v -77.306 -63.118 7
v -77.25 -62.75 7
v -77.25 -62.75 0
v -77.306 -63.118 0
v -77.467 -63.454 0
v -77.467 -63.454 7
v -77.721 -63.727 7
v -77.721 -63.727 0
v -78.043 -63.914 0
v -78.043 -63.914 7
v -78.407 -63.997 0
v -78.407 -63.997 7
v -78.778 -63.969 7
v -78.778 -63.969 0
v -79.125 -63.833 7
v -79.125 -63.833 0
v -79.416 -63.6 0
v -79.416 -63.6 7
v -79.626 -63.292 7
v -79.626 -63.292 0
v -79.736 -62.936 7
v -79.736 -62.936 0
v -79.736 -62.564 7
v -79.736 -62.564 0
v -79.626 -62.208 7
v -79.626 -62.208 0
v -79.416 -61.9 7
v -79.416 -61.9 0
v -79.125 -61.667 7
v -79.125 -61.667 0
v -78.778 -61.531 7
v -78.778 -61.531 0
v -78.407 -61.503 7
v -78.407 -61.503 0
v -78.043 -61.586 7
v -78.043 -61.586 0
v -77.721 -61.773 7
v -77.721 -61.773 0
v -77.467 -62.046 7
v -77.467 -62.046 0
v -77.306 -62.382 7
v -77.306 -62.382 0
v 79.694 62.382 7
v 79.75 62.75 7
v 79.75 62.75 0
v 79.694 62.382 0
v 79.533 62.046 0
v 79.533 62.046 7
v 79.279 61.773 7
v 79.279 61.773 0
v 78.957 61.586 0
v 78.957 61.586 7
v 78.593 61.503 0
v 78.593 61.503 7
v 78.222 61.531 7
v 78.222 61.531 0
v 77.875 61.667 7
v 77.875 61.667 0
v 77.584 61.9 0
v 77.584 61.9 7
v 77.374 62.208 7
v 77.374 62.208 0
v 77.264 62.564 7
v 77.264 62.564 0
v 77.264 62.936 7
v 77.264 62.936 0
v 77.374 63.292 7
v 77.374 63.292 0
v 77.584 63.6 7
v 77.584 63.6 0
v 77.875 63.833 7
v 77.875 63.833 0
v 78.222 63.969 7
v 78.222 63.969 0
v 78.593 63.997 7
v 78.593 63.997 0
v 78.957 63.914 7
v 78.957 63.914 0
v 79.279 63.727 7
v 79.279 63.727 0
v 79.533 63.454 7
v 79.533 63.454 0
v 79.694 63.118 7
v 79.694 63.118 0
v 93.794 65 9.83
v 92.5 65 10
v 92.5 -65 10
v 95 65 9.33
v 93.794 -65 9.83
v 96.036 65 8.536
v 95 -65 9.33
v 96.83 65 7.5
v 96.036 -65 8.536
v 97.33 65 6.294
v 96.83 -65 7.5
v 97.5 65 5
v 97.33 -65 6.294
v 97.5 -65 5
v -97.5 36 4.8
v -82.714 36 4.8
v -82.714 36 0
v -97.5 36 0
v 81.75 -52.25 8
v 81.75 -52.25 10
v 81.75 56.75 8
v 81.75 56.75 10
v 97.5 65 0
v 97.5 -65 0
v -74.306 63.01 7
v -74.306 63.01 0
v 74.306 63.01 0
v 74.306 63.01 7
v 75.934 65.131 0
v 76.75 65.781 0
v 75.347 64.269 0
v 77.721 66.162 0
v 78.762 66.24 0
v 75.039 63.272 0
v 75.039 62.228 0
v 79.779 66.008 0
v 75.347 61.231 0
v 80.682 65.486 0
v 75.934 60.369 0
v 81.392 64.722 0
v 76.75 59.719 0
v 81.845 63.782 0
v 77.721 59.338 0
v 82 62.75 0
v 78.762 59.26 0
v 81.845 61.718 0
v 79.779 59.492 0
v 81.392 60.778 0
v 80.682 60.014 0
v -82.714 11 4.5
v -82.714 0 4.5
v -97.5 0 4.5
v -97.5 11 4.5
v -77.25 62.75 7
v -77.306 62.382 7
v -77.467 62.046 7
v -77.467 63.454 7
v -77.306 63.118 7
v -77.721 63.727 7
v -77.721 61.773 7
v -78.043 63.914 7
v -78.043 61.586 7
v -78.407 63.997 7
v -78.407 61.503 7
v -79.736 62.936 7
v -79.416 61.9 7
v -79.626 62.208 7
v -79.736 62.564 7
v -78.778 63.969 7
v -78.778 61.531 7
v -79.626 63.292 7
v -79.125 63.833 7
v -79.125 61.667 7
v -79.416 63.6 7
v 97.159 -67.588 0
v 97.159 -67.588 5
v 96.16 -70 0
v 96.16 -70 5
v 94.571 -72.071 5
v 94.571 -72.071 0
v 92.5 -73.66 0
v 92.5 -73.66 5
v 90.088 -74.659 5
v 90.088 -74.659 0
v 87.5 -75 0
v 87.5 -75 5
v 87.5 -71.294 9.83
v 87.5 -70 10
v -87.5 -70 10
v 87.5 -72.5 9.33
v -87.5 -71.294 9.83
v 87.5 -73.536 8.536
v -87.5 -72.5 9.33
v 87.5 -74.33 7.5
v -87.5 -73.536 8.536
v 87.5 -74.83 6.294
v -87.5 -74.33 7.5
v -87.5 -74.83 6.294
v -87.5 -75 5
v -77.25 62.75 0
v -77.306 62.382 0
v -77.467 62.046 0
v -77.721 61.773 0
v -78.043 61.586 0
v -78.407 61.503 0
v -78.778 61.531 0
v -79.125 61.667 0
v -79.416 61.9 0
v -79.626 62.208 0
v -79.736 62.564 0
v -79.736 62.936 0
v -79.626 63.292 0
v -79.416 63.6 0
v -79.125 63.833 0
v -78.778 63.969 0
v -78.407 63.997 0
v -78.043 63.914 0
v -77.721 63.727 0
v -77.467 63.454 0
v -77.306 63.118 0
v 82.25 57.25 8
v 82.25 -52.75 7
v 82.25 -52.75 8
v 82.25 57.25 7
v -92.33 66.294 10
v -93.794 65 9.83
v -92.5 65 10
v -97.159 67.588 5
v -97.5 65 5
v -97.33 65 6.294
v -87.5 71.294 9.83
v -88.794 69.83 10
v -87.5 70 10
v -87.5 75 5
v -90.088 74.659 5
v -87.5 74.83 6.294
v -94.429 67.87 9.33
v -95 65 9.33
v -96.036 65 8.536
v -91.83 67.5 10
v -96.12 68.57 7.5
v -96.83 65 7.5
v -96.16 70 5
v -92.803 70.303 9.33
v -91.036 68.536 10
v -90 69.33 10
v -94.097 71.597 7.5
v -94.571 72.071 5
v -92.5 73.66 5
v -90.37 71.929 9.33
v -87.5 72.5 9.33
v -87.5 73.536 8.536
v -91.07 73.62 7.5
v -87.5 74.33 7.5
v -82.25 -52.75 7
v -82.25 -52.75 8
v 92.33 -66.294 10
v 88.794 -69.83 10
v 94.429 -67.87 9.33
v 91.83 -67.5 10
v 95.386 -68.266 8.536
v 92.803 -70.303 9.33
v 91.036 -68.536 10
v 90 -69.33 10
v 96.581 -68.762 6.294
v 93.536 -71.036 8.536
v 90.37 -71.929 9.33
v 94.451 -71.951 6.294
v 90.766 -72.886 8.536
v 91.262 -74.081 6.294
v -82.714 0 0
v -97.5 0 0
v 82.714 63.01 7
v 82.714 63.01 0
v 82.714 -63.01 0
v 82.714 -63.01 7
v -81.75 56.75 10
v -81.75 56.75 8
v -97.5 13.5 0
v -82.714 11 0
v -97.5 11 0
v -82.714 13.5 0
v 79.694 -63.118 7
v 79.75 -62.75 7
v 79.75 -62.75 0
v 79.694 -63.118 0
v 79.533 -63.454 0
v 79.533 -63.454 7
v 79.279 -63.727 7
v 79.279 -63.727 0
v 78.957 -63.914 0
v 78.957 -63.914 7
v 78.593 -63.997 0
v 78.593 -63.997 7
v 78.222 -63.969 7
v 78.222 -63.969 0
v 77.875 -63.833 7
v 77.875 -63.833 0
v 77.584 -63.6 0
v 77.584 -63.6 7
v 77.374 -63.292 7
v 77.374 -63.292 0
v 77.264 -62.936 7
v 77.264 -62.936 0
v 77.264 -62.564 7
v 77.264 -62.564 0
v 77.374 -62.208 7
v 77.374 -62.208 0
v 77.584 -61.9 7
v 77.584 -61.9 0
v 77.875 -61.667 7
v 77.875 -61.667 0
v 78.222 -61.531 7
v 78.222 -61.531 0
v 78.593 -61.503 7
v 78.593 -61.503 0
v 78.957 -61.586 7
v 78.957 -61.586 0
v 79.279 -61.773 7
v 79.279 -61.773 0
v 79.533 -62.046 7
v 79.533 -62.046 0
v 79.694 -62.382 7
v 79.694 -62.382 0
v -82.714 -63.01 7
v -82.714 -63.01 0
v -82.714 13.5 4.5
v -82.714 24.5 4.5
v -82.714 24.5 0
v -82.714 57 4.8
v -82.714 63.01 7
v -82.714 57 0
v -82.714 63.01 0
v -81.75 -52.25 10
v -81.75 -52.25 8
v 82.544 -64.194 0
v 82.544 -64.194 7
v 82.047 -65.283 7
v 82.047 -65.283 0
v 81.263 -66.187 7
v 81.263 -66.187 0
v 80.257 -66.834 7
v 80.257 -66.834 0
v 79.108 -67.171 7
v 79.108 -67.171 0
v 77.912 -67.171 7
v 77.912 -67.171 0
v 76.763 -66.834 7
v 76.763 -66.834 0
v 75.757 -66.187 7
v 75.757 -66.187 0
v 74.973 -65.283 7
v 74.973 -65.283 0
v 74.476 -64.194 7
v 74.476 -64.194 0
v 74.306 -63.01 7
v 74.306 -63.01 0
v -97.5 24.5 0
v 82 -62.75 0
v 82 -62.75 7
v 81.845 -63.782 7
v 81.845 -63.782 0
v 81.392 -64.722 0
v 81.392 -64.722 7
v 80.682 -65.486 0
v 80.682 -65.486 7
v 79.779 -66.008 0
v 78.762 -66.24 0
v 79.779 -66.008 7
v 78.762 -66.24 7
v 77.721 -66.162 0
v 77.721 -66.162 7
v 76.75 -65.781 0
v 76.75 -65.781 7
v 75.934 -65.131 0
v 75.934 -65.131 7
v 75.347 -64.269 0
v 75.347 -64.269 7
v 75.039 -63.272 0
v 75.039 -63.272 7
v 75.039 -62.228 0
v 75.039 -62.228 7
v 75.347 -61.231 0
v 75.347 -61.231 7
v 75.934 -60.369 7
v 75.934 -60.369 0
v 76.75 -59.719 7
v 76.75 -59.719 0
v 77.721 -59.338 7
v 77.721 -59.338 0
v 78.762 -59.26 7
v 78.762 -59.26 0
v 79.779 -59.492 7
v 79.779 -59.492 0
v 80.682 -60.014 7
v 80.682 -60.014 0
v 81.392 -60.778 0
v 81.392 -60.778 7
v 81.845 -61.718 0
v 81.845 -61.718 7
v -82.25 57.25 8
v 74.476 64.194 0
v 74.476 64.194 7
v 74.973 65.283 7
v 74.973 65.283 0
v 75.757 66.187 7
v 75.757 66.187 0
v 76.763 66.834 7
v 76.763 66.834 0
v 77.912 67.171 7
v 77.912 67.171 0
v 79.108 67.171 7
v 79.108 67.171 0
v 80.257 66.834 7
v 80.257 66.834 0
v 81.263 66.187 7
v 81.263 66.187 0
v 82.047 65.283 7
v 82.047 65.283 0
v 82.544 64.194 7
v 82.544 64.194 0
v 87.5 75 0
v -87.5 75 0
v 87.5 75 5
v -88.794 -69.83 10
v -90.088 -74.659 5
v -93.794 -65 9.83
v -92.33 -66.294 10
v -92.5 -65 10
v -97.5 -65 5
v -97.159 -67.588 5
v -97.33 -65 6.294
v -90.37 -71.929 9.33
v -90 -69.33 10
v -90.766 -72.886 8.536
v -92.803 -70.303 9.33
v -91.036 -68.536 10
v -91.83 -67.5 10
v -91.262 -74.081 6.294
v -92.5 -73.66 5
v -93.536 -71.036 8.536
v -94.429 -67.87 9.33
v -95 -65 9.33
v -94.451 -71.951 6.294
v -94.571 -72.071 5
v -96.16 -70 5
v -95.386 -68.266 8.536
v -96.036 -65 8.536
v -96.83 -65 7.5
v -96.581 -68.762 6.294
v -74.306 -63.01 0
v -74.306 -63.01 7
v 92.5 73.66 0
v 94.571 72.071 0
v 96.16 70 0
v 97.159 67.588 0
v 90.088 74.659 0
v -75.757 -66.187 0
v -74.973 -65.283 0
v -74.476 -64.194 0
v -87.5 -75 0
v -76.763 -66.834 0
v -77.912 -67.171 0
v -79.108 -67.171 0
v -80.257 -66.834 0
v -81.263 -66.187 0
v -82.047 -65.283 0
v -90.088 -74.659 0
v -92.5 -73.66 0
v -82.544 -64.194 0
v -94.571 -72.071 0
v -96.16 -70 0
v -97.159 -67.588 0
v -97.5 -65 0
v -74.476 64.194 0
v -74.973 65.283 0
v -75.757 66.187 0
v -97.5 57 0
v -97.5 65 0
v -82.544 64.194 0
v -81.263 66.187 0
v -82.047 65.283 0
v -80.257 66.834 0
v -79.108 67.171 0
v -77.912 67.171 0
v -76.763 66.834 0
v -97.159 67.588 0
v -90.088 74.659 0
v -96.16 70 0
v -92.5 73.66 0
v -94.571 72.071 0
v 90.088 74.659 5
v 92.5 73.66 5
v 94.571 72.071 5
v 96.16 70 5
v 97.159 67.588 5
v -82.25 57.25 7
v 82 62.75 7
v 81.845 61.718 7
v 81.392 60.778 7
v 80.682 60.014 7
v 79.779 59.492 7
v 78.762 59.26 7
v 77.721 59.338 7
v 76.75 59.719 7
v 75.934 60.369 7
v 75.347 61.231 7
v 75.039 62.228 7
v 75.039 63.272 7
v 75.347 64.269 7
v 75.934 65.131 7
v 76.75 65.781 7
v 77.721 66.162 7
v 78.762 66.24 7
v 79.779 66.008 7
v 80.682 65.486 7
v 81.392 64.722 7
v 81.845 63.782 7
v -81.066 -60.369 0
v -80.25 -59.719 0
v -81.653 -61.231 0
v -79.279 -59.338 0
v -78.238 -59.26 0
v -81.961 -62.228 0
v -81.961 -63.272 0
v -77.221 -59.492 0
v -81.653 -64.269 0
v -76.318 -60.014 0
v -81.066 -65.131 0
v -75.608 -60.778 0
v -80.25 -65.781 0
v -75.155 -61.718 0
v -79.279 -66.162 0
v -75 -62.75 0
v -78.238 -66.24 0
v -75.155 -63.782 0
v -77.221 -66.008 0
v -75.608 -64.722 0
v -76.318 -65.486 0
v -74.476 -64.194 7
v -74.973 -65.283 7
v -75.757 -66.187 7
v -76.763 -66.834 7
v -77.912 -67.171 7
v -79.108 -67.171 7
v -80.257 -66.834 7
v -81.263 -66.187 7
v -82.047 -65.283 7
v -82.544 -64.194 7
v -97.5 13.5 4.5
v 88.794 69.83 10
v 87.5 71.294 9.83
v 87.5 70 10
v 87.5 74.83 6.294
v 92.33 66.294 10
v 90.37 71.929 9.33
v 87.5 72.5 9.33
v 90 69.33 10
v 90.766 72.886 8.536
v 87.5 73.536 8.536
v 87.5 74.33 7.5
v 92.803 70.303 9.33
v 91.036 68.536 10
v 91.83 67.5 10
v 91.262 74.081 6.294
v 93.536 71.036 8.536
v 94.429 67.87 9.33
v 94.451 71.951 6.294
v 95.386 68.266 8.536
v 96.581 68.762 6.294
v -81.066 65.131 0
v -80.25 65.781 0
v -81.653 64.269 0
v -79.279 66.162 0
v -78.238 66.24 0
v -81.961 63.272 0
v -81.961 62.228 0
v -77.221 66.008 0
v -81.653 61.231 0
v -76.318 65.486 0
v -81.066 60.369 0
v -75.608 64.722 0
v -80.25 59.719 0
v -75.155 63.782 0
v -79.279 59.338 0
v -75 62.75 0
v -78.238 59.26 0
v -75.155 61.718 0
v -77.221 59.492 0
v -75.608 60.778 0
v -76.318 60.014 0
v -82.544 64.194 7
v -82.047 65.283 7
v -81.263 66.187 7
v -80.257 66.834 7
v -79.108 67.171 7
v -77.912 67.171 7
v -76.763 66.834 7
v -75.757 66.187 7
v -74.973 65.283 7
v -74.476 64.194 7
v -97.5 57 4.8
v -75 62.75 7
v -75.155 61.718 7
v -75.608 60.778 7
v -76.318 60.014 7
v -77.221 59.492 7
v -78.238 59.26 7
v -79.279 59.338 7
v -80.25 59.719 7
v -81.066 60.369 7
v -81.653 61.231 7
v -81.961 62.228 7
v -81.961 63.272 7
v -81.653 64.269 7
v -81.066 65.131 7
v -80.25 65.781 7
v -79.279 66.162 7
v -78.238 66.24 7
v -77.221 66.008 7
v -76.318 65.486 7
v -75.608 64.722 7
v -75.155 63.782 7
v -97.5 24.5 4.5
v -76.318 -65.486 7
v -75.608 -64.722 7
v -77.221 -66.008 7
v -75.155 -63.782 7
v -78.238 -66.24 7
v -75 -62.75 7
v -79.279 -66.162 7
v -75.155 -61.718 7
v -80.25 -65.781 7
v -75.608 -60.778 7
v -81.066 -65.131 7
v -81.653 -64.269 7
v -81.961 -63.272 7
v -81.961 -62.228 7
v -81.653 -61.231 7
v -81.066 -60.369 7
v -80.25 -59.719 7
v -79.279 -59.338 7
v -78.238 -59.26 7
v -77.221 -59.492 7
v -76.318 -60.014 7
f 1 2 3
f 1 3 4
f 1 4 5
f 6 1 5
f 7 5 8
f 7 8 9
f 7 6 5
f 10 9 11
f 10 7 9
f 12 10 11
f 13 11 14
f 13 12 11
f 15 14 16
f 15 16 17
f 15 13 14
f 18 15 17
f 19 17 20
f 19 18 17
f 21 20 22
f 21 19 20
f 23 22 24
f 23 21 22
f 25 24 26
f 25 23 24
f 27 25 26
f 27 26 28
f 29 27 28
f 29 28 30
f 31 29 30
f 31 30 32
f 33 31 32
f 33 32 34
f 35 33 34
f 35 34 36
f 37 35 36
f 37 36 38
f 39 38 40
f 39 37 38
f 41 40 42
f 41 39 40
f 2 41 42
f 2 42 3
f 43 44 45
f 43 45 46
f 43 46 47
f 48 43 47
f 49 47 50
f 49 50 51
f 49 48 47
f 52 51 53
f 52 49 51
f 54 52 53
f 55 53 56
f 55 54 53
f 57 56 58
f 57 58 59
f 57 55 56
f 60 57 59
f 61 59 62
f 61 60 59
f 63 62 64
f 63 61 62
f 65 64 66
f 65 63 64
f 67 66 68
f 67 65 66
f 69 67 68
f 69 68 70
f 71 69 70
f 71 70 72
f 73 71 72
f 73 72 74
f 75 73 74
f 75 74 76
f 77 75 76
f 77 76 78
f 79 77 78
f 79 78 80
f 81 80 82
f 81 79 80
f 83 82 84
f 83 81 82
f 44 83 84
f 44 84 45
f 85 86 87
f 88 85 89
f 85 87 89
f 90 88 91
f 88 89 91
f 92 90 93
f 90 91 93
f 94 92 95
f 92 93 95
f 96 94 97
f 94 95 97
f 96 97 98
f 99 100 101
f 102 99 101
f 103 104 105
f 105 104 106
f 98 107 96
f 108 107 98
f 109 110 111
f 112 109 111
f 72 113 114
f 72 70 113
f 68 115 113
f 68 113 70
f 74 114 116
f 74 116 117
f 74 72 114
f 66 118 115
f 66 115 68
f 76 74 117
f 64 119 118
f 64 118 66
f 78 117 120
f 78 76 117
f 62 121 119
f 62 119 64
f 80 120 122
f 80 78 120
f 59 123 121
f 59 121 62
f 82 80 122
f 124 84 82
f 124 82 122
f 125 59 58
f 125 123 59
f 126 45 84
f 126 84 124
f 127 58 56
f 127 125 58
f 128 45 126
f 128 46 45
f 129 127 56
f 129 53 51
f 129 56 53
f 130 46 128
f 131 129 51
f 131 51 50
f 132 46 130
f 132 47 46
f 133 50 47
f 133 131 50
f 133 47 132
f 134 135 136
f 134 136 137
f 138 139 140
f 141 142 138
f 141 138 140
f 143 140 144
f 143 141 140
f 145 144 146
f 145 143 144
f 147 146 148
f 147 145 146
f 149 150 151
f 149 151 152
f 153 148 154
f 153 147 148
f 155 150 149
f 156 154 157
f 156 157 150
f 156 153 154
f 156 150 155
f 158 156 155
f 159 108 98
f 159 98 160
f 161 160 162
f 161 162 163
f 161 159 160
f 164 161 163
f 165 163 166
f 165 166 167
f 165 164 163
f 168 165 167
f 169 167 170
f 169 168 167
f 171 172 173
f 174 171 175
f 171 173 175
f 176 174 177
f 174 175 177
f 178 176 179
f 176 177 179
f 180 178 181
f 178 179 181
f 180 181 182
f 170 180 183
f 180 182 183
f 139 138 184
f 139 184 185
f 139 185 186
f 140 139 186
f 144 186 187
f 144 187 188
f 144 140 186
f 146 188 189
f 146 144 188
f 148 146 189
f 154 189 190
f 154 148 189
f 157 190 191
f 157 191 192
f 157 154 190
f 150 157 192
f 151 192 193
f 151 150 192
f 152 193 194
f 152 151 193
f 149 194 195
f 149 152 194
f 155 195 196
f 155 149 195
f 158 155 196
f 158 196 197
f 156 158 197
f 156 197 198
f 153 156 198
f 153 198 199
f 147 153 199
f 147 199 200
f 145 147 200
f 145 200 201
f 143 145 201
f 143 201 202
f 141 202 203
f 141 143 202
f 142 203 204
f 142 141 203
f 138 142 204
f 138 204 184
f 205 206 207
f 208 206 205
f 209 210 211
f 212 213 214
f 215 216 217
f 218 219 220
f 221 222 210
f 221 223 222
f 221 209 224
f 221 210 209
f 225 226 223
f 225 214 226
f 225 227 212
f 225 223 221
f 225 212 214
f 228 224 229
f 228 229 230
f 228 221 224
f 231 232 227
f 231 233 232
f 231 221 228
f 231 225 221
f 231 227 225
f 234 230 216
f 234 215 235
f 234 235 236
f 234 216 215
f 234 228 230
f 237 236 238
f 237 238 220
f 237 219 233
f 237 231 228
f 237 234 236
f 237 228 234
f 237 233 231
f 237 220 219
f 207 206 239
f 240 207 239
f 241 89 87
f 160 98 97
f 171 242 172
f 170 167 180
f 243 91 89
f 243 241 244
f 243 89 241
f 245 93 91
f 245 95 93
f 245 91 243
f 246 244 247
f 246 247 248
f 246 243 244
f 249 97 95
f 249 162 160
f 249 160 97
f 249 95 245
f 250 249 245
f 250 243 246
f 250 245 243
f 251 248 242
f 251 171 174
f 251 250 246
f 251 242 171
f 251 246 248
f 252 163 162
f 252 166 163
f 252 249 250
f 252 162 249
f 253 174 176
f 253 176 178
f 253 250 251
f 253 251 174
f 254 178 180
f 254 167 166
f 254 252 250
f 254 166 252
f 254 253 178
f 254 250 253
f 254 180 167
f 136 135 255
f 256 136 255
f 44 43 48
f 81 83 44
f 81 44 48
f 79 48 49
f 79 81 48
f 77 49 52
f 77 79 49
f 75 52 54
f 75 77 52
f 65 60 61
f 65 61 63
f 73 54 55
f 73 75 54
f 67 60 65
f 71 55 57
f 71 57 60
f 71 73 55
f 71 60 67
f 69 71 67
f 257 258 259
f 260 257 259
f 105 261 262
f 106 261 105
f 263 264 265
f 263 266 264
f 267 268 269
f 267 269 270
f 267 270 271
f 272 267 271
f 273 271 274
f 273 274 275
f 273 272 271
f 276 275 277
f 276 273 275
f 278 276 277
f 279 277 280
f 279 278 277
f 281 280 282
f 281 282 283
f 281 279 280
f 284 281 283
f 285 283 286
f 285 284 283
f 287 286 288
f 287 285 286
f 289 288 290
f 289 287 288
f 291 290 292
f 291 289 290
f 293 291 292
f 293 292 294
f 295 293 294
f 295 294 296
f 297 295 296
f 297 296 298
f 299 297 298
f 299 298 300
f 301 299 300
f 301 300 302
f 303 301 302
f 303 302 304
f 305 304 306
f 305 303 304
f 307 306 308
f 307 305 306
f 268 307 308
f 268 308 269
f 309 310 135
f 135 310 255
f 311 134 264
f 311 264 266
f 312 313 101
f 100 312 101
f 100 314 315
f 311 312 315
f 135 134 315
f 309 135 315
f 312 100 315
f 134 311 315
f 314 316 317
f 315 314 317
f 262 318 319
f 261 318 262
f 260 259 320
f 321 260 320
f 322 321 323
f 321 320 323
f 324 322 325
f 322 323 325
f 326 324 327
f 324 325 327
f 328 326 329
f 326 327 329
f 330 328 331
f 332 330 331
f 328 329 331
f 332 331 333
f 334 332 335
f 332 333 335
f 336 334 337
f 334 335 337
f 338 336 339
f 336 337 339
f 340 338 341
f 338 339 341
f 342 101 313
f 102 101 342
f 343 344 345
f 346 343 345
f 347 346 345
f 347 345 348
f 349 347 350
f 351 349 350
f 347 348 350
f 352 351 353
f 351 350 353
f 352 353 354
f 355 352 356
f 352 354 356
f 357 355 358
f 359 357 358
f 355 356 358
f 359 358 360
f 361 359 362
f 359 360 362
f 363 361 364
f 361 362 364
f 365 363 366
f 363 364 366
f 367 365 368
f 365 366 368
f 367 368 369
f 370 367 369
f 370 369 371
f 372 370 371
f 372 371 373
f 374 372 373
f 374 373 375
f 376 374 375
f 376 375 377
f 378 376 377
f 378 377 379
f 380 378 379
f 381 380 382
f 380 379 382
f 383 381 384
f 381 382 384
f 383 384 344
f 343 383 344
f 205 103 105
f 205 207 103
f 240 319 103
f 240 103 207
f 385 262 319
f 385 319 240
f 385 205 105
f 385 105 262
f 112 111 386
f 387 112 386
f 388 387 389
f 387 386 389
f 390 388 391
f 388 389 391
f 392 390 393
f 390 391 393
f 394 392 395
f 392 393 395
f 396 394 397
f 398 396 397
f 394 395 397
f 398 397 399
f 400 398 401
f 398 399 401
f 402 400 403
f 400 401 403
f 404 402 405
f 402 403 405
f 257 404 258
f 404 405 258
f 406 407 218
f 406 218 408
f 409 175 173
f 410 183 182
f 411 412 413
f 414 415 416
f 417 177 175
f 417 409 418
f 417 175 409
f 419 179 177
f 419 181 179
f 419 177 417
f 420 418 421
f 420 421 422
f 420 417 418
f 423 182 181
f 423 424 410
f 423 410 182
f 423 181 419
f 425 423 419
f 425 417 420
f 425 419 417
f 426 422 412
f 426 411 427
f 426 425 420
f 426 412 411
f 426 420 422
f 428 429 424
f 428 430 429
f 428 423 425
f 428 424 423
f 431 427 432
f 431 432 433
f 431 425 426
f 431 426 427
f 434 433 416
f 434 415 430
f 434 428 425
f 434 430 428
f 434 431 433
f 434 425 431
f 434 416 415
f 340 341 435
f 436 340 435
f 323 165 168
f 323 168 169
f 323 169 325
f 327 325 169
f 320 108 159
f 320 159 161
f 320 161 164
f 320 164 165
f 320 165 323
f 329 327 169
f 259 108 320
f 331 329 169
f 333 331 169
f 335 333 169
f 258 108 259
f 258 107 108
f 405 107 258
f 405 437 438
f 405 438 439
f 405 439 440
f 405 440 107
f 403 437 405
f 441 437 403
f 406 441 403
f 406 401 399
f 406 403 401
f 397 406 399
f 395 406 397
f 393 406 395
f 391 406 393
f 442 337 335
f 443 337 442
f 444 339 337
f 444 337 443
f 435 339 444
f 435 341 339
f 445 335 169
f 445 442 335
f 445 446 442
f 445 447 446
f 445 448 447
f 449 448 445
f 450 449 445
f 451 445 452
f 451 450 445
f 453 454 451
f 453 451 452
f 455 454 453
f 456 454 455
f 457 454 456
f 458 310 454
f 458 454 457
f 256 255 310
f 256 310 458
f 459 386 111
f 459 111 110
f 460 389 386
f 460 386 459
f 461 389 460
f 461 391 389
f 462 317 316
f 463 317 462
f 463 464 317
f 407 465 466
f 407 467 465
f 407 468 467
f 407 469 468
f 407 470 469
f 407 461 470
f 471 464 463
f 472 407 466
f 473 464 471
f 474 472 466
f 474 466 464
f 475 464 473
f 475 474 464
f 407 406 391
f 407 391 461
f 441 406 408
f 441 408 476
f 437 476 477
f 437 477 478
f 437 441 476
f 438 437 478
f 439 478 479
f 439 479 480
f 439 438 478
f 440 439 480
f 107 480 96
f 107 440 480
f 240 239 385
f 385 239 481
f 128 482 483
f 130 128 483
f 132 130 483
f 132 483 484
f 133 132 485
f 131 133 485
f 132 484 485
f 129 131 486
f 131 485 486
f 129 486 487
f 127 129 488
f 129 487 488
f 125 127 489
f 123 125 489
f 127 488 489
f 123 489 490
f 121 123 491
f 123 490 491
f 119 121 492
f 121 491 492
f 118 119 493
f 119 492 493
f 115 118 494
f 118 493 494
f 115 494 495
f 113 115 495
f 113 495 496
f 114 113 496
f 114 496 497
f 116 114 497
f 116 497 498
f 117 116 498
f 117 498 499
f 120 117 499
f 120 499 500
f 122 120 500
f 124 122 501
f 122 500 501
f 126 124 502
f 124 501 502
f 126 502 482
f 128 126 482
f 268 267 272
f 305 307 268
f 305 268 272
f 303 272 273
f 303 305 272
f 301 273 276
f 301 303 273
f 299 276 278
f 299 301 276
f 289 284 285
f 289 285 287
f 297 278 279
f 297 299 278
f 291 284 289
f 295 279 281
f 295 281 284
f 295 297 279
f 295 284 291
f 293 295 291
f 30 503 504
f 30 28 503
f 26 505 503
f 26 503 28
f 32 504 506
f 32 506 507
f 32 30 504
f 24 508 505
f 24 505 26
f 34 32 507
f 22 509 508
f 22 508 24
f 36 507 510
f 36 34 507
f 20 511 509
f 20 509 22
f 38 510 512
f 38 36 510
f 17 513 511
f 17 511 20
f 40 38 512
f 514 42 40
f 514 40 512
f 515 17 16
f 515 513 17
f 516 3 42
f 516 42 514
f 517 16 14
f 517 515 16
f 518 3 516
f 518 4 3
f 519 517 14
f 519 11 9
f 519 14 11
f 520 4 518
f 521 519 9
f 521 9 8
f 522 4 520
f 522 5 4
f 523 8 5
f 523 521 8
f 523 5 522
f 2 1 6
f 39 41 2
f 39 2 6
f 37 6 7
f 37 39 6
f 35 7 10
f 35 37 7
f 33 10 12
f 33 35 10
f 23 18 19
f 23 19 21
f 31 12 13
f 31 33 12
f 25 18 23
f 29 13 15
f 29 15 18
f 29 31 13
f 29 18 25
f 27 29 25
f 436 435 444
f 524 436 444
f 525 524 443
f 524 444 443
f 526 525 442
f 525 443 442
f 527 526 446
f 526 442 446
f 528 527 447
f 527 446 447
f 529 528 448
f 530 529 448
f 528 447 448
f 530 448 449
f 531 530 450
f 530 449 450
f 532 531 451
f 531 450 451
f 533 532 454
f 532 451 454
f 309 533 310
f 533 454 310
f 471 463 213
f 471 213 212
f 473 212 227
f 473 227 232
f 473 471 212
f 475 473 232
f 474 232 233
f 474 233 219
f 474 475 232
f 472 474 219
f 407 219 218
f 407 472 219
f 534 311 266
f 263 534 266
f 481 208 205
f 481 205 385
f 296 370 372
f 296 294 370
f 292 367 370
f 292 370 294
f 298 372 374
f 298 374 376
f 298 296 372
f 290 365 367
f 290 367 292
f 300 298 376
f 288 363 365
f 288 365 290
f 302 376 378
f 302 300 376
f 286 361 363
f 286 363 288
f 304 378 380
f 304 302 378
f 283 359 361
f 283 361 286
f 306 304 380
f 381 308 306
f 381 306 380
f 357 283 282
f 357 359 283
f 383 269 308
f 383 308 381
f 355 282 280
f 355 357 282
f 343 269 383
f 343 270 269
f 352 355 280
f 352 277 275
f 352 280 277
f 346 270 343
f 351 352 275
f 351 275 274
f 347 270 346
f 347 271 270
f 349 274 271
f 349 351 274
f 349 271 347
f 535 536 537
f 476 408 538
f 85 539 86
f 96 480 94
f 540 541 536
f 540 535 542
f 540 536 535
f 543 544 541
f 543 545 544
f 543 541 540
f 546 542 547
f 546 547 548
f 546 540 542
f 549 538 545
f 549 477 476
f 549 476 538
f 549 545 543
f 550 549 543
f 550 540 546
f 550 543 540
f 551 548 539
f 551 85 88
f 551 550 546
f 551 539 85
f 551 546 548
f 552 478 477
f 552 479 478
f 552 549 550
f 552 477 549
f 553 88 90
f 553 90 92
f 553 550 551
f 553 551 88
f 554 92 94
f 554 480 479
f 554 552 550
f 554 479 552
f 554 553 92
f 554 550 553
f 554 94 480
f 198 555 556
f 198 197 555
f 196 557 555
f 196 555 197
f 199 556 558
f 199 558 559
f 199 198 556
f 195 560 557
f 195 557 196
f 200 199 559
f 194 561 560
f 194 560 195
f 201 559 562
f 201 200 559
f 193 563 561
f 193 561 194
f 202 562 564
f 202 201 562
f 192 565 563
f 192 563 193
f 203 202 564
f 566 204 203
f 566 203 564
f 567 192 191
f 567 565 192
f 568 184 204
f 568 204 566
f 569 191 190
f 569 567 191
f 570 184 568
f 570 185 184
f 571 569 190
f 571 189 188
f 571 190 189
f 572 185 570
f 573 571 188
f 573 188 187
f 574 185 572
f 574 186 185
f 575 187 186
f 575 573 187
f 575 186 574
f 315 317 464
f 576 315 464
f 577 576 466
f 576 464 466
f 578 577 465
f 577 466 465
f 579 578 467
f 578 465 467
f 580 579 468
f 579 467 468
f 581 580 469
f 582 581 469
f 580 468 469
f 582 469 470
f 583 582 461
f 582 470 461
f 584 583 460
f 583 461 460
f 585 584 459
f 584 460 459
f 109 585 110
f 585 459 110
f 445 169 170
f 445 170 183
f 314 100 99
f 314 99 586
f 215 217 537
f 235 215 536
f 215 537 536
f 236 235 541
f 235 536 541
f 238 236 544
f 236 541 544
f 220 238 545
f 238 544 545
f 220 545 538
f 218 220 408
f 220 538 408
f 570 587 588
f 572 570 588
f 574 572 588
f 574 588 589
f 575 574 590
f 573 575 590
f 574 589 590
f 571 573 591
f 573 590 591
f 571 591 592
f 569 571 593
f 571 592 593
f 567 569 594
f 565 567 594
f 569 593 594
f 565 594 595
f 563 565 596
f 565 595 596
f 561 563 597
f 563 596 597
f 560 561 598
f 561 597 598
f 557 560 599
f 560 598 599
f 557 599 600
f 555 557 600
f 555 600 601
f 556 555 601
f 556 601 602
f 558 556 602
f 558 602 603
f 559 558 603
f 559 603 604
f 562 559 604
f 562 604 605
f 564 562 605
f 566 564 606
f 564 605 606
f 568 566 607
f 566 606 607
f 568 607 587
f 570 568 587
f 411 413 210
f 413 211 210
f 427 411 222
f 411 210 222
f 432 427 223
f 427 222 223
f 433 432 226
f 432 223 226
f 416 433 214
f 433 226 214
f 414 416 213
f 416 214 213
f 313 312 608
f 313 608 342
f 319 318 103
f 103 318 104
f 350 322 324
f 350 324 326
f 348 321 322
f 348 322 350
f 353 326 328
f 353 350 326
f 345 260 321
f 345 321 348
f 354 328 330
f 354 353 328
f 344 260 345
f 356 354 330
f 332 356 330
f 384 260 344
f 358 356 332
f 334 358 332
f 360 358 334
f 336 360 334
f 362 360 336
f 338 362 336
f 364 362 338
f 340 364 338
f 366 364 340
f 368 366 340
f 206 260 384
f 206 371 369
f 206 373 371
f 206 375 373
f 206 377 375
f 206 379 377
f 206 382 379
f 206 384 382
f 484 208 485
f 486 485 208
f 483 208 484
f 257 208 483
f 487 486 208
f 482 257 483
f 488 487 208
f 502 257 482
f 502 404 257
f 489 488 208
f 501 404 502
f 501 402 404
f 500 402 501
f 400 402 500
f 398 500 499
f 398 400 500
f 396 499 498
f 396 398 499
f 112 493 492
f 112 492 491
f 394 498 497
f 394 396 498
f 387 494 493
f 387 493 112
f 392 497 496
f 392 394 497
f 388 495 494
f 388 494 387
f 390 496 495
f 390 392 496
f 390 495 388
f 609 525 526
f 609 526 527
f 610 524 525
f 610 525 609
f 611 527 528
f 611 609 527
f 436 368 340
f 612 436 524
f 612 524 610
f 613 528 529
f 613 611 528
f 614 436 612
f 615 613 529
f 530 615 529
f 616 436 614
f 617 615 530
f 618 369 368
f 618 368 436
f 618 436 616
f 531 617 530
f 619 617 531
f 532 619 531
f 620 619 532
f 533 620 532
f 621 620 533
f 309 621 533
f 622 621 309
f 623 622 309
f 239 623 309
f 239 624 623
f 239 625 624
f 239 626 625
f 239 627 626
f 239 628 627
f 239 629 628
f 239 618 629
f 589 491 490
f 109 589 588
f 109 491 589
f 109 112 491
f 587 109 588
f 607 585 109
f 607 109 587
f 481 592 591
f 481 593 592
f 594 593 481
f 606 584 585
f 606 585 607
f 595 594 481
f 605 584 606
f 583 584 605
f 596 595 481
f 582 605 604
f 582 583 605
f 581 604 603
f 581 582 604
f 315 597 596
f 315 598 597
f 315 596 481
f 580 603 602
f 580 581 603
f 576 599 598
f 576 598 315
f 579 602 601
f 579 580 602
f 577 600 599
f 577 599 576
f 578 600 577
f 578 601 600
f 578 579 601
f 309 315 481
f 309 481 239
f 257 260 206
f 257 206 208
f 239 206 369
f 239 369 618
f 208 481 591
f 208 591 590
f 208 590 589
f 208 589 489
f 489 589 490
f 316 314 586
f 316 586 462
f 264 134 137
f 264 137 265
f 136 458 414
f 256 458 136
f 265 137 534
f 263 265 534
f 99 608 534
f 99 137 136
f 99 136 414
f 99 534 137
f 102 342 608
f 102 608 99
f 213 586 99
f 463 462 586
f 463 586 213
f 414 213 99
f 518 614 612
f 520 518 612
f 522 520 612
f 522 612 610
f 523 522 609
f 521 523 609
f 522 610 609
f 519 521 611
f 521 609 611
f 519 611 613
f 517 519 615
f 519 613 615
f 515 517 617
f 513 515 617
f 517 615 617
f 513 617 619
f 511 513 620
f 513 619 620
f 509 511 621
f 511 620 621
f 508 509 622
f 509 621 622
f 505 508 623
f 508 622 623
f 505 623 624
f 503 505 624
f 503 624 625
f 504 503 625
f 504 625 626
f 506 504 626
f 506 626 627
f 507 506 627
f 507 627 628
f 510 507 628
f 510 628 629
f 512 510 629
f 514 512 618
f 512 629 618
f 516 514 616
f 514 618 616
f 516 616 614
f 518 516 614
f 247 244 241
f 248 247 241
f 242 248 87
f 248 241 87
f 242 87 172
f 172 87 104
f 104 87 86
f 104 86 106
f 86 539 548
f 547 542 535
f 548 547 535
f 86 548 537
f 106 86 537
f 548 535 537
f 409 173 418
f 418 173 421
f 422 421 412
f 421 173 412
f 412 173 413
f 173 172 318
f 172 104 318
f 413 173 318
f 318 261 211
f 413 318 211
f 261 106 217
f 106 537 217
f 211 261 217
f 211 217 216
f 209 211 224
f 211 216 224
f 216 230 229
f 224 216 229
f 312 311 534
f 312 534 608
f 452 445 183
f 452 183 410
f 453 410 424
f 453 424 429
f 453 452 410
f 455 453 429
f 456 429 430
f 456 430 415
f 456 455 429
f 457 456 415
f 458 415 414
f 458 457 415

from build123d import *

# Parameters (mm, degrees)
BOSS_EXTRU_1_DEPTH      = 10
ESQUISSE2_W             = 163.5
ESQUISSE2_H             = 109
ENL_V_MAT_EXTRU_1_DEPTH = 10
ESQUISSE3_W             = 164.5
ESQUISSE3_H             = 110
ENL_V_MAT_EXTRU_2_DEPTH = 8
ENL_V_MAT_EXTRU_3_DEPTH = 7
ESQUISSE5_R             = 3.5
ESQUISSE5_R_2           = 1.25
BOSS_EXTRU_2_DEPTH      = 7
CONG_1_R                = 5
ESQUISSE6_W             = 12.13
ESQUISSE6_H             = 21
ESQUISSE6_W_2           = 8
ESQUISSE6_H_2           = 11
ENL_V_MAT_EXTRU_4_DEPTH = 97.5


with BuildPart() as part:
    # Esquisse1 → Boss.-Extru.1 (new body)
    with BuildSketch(Plane.XY):
        with BuildLine():
            Line((87.5, -75), (-87.5, -75))
            ThreePointArc((-87.5, -75), (-94.571067812, -72.071067812), (-97.5, -65))
            Line((-97.5, -65), (-97.5, 65))
            ThreePointArc((-97.5, 65), (-94.571067812, 72.071067812), (-87.5, 75))
            Line((-87.5, 75), (87.5, 75))
            ThreePointArc((87.5, 75), (94.571067812, 72.071067812), (97.5, 65))
            Line((97.5, 65), (97.5, -65))
            ThreePointArc((97.5, -65), (94.571067812, -72.071067812), (87.5, -75))
        make_face()
    extrude(amount=BOSS_EXTRU_1_DEPTH)

    # Esquisse2 → Enlèv. mat.-Extru.1 (cut)
    with BuildSketch(Plane.XY.offset(10)):
        with Locations((0, 2.25)):
            Rectangle(ESQUISSE2_W, ESQUISSE2_H)
    extrude(amount=-ENL_V_MAT_EXTRU_1_DEPTH, mode=Mode.SUBTRACT)

    # Esquisse3 → Enlèv. mat.-Extru.2 (cut)
    with BuildSketch(Plane(origin=(0, 0, 0), x_dir=(-1, 0, 0), z_dir=(0, 0, -1))):
        with Locations((0, 2.25)):
            Rectangle(ESQUISSE3_W, ESQUISSE3_H)
    extrude(amount=-ENL_V_MAT_EXTRU_2_DEPTH, mode=Mode.SUBTRACT)

    # Esquisse4 → Enlèv. mat.-Extru.3 (cut)
    with BuildSketch(Plane(origin=(0, 0, 0), x_dir=(-1, 0, 0), z_dir=(0, 0, -1))):
        with BuildLine():
            Line((-74.305753882, -63.01), (74.305753882, -63.01))
            ThreePointArc((74.305753882, -63.01), (78.51, -67.214246118), (82.714246118, -63.01))
            Line((82.714246118, -63.01), (82.714246118, 63.01))
            ThreePointArc((82.714246118, 63.01), (78.51, 67.214246118), (74.305753882, 63.01))
            Line((74.305753882, 63.01), (-74.305753882, 63.01))
            ThreePointArc((-74.305753882, 63.01), (-78.51, 67.214246118), (-82.714246118, 63.01))
            Line((-82.714246118, 63.01), (-82.714246118, -63.01))
            ThreePointArc((-82.714246118, -63.01), (-78.51, -67.214246118), (-74.305753882, -63.01))
        make_face()
    extrude(amount=-ENL_V_MAT_EXTRU_3_DEPTH, mode=Mode.SUBTRACT)

    # Esquisse5 → Boss.-Extru.2 (add)
    # profile 1 of 4: a face of its own
    with BuildSketch(Plane(origin=(0, 0, 7), x_dir=(-1, 0, 0), z_dir=(0, 0, -1))):
        with Locations(Location((-78.5, -62.75, 0), (0, 0, 180))):
            Circle(ESQUISSE5_R)
        with Locations(Location((-78.5, -62.75, 0), (0, 0, 180))):
            Circle(ESQUISSE5_R_2, mode=Mode.SUBTRACT)
    # profile 2 of 4: a face of its own
    with BuildSketch(Plane(origin=(0, 0, 7), x_dir=(-1, 0, 0), z_dir=(0, 0, -1))):
        with Locations(Location((78.5, -62.75, 0), (0, 0, 180))):
            Circle(ESQUISSE5_R)
        with Locations(Location((78.5, -62.75, 0), (0, 0, 180))):
            Circle(ESQUISSE5_R_2, mode=Mode.SUBTRACT)
    # profile 3 of 4: a face of its own
    with BuildSketch(Plane(origin=(0, 0, 7), x_dir=(-1, 0, 0), z_dir=(0, 0, -1))):
        with Locations(Location((78.5, 62.75, 0), (0, 0, 180))):
            Circle(ESQUISSE5_R)
        with Locations(Location((78.5, 62.75, 0), (0, 0, 180))):
            Circle(ESQUISSE5_R_2, mode=Mode.SUBTRACT)
    # profile 4 of 4: a face of its own
    with BuildSketch(Plane(origin=(0, 0, 7), x_dir=(-1, 0, 0), z_dir=(0, 0, -1))):
        with Locations(Location((-78.5, 62.75, 0), (0, 0, 180))):
            Circle(ESQUISSE5_R)
        with Locations(Location((-78.5, 62.75, 0), (0, 0, 180))):
            Circle(ESQUISSE5_R_2, mode=Mode.SUBTRACT)
    extrude(amount=BOSS_EXTRU_2_DEPTH)

    # Congé1
    cong_1_edges = [part.edges().sort_by_distance(p)[0] for p in [
        (-94.571067812, 72.071067812, 10),
        (-97.5, 0, 10),
        (-94.571067812, -72.071067812, 10),
        (0, -75, 10),
        (94.571067812, -72.071067812, 10),
        (97.5, 0, 10),
        (94.571067812, 72.071067812, 10),
        (0, 75, 10),
    ]]
    fillet(cong_1_edges, radius=CONG_1_R)

    # Esquisse6 → Enlèv. mat.-Extru.4 (cut)
    with BuildSketch(Plane(origin=(0, 0, 0), x_dir=(0, 0, -1), z_dir=(1, 0, 0))):
        with Locations((1.265, 46.5)):
            Rectangle(ESQUISSE6_W, ESQUISSE6_H)
        with Locations((-0.5, 19)):
            Rectangle(ESQUISSE6_W_2, ESQUISSE6_H_2)
        with Locations((-0.5, 5.5)):
            Rectangle(ESQUISSE6_W_2, ESQUISSE6_H_2)
    extrude(amount=-ENL_V_MAT_EXTRU_4_DEPTH, mode=Mode.SUBTRACT)


solid = part.part
